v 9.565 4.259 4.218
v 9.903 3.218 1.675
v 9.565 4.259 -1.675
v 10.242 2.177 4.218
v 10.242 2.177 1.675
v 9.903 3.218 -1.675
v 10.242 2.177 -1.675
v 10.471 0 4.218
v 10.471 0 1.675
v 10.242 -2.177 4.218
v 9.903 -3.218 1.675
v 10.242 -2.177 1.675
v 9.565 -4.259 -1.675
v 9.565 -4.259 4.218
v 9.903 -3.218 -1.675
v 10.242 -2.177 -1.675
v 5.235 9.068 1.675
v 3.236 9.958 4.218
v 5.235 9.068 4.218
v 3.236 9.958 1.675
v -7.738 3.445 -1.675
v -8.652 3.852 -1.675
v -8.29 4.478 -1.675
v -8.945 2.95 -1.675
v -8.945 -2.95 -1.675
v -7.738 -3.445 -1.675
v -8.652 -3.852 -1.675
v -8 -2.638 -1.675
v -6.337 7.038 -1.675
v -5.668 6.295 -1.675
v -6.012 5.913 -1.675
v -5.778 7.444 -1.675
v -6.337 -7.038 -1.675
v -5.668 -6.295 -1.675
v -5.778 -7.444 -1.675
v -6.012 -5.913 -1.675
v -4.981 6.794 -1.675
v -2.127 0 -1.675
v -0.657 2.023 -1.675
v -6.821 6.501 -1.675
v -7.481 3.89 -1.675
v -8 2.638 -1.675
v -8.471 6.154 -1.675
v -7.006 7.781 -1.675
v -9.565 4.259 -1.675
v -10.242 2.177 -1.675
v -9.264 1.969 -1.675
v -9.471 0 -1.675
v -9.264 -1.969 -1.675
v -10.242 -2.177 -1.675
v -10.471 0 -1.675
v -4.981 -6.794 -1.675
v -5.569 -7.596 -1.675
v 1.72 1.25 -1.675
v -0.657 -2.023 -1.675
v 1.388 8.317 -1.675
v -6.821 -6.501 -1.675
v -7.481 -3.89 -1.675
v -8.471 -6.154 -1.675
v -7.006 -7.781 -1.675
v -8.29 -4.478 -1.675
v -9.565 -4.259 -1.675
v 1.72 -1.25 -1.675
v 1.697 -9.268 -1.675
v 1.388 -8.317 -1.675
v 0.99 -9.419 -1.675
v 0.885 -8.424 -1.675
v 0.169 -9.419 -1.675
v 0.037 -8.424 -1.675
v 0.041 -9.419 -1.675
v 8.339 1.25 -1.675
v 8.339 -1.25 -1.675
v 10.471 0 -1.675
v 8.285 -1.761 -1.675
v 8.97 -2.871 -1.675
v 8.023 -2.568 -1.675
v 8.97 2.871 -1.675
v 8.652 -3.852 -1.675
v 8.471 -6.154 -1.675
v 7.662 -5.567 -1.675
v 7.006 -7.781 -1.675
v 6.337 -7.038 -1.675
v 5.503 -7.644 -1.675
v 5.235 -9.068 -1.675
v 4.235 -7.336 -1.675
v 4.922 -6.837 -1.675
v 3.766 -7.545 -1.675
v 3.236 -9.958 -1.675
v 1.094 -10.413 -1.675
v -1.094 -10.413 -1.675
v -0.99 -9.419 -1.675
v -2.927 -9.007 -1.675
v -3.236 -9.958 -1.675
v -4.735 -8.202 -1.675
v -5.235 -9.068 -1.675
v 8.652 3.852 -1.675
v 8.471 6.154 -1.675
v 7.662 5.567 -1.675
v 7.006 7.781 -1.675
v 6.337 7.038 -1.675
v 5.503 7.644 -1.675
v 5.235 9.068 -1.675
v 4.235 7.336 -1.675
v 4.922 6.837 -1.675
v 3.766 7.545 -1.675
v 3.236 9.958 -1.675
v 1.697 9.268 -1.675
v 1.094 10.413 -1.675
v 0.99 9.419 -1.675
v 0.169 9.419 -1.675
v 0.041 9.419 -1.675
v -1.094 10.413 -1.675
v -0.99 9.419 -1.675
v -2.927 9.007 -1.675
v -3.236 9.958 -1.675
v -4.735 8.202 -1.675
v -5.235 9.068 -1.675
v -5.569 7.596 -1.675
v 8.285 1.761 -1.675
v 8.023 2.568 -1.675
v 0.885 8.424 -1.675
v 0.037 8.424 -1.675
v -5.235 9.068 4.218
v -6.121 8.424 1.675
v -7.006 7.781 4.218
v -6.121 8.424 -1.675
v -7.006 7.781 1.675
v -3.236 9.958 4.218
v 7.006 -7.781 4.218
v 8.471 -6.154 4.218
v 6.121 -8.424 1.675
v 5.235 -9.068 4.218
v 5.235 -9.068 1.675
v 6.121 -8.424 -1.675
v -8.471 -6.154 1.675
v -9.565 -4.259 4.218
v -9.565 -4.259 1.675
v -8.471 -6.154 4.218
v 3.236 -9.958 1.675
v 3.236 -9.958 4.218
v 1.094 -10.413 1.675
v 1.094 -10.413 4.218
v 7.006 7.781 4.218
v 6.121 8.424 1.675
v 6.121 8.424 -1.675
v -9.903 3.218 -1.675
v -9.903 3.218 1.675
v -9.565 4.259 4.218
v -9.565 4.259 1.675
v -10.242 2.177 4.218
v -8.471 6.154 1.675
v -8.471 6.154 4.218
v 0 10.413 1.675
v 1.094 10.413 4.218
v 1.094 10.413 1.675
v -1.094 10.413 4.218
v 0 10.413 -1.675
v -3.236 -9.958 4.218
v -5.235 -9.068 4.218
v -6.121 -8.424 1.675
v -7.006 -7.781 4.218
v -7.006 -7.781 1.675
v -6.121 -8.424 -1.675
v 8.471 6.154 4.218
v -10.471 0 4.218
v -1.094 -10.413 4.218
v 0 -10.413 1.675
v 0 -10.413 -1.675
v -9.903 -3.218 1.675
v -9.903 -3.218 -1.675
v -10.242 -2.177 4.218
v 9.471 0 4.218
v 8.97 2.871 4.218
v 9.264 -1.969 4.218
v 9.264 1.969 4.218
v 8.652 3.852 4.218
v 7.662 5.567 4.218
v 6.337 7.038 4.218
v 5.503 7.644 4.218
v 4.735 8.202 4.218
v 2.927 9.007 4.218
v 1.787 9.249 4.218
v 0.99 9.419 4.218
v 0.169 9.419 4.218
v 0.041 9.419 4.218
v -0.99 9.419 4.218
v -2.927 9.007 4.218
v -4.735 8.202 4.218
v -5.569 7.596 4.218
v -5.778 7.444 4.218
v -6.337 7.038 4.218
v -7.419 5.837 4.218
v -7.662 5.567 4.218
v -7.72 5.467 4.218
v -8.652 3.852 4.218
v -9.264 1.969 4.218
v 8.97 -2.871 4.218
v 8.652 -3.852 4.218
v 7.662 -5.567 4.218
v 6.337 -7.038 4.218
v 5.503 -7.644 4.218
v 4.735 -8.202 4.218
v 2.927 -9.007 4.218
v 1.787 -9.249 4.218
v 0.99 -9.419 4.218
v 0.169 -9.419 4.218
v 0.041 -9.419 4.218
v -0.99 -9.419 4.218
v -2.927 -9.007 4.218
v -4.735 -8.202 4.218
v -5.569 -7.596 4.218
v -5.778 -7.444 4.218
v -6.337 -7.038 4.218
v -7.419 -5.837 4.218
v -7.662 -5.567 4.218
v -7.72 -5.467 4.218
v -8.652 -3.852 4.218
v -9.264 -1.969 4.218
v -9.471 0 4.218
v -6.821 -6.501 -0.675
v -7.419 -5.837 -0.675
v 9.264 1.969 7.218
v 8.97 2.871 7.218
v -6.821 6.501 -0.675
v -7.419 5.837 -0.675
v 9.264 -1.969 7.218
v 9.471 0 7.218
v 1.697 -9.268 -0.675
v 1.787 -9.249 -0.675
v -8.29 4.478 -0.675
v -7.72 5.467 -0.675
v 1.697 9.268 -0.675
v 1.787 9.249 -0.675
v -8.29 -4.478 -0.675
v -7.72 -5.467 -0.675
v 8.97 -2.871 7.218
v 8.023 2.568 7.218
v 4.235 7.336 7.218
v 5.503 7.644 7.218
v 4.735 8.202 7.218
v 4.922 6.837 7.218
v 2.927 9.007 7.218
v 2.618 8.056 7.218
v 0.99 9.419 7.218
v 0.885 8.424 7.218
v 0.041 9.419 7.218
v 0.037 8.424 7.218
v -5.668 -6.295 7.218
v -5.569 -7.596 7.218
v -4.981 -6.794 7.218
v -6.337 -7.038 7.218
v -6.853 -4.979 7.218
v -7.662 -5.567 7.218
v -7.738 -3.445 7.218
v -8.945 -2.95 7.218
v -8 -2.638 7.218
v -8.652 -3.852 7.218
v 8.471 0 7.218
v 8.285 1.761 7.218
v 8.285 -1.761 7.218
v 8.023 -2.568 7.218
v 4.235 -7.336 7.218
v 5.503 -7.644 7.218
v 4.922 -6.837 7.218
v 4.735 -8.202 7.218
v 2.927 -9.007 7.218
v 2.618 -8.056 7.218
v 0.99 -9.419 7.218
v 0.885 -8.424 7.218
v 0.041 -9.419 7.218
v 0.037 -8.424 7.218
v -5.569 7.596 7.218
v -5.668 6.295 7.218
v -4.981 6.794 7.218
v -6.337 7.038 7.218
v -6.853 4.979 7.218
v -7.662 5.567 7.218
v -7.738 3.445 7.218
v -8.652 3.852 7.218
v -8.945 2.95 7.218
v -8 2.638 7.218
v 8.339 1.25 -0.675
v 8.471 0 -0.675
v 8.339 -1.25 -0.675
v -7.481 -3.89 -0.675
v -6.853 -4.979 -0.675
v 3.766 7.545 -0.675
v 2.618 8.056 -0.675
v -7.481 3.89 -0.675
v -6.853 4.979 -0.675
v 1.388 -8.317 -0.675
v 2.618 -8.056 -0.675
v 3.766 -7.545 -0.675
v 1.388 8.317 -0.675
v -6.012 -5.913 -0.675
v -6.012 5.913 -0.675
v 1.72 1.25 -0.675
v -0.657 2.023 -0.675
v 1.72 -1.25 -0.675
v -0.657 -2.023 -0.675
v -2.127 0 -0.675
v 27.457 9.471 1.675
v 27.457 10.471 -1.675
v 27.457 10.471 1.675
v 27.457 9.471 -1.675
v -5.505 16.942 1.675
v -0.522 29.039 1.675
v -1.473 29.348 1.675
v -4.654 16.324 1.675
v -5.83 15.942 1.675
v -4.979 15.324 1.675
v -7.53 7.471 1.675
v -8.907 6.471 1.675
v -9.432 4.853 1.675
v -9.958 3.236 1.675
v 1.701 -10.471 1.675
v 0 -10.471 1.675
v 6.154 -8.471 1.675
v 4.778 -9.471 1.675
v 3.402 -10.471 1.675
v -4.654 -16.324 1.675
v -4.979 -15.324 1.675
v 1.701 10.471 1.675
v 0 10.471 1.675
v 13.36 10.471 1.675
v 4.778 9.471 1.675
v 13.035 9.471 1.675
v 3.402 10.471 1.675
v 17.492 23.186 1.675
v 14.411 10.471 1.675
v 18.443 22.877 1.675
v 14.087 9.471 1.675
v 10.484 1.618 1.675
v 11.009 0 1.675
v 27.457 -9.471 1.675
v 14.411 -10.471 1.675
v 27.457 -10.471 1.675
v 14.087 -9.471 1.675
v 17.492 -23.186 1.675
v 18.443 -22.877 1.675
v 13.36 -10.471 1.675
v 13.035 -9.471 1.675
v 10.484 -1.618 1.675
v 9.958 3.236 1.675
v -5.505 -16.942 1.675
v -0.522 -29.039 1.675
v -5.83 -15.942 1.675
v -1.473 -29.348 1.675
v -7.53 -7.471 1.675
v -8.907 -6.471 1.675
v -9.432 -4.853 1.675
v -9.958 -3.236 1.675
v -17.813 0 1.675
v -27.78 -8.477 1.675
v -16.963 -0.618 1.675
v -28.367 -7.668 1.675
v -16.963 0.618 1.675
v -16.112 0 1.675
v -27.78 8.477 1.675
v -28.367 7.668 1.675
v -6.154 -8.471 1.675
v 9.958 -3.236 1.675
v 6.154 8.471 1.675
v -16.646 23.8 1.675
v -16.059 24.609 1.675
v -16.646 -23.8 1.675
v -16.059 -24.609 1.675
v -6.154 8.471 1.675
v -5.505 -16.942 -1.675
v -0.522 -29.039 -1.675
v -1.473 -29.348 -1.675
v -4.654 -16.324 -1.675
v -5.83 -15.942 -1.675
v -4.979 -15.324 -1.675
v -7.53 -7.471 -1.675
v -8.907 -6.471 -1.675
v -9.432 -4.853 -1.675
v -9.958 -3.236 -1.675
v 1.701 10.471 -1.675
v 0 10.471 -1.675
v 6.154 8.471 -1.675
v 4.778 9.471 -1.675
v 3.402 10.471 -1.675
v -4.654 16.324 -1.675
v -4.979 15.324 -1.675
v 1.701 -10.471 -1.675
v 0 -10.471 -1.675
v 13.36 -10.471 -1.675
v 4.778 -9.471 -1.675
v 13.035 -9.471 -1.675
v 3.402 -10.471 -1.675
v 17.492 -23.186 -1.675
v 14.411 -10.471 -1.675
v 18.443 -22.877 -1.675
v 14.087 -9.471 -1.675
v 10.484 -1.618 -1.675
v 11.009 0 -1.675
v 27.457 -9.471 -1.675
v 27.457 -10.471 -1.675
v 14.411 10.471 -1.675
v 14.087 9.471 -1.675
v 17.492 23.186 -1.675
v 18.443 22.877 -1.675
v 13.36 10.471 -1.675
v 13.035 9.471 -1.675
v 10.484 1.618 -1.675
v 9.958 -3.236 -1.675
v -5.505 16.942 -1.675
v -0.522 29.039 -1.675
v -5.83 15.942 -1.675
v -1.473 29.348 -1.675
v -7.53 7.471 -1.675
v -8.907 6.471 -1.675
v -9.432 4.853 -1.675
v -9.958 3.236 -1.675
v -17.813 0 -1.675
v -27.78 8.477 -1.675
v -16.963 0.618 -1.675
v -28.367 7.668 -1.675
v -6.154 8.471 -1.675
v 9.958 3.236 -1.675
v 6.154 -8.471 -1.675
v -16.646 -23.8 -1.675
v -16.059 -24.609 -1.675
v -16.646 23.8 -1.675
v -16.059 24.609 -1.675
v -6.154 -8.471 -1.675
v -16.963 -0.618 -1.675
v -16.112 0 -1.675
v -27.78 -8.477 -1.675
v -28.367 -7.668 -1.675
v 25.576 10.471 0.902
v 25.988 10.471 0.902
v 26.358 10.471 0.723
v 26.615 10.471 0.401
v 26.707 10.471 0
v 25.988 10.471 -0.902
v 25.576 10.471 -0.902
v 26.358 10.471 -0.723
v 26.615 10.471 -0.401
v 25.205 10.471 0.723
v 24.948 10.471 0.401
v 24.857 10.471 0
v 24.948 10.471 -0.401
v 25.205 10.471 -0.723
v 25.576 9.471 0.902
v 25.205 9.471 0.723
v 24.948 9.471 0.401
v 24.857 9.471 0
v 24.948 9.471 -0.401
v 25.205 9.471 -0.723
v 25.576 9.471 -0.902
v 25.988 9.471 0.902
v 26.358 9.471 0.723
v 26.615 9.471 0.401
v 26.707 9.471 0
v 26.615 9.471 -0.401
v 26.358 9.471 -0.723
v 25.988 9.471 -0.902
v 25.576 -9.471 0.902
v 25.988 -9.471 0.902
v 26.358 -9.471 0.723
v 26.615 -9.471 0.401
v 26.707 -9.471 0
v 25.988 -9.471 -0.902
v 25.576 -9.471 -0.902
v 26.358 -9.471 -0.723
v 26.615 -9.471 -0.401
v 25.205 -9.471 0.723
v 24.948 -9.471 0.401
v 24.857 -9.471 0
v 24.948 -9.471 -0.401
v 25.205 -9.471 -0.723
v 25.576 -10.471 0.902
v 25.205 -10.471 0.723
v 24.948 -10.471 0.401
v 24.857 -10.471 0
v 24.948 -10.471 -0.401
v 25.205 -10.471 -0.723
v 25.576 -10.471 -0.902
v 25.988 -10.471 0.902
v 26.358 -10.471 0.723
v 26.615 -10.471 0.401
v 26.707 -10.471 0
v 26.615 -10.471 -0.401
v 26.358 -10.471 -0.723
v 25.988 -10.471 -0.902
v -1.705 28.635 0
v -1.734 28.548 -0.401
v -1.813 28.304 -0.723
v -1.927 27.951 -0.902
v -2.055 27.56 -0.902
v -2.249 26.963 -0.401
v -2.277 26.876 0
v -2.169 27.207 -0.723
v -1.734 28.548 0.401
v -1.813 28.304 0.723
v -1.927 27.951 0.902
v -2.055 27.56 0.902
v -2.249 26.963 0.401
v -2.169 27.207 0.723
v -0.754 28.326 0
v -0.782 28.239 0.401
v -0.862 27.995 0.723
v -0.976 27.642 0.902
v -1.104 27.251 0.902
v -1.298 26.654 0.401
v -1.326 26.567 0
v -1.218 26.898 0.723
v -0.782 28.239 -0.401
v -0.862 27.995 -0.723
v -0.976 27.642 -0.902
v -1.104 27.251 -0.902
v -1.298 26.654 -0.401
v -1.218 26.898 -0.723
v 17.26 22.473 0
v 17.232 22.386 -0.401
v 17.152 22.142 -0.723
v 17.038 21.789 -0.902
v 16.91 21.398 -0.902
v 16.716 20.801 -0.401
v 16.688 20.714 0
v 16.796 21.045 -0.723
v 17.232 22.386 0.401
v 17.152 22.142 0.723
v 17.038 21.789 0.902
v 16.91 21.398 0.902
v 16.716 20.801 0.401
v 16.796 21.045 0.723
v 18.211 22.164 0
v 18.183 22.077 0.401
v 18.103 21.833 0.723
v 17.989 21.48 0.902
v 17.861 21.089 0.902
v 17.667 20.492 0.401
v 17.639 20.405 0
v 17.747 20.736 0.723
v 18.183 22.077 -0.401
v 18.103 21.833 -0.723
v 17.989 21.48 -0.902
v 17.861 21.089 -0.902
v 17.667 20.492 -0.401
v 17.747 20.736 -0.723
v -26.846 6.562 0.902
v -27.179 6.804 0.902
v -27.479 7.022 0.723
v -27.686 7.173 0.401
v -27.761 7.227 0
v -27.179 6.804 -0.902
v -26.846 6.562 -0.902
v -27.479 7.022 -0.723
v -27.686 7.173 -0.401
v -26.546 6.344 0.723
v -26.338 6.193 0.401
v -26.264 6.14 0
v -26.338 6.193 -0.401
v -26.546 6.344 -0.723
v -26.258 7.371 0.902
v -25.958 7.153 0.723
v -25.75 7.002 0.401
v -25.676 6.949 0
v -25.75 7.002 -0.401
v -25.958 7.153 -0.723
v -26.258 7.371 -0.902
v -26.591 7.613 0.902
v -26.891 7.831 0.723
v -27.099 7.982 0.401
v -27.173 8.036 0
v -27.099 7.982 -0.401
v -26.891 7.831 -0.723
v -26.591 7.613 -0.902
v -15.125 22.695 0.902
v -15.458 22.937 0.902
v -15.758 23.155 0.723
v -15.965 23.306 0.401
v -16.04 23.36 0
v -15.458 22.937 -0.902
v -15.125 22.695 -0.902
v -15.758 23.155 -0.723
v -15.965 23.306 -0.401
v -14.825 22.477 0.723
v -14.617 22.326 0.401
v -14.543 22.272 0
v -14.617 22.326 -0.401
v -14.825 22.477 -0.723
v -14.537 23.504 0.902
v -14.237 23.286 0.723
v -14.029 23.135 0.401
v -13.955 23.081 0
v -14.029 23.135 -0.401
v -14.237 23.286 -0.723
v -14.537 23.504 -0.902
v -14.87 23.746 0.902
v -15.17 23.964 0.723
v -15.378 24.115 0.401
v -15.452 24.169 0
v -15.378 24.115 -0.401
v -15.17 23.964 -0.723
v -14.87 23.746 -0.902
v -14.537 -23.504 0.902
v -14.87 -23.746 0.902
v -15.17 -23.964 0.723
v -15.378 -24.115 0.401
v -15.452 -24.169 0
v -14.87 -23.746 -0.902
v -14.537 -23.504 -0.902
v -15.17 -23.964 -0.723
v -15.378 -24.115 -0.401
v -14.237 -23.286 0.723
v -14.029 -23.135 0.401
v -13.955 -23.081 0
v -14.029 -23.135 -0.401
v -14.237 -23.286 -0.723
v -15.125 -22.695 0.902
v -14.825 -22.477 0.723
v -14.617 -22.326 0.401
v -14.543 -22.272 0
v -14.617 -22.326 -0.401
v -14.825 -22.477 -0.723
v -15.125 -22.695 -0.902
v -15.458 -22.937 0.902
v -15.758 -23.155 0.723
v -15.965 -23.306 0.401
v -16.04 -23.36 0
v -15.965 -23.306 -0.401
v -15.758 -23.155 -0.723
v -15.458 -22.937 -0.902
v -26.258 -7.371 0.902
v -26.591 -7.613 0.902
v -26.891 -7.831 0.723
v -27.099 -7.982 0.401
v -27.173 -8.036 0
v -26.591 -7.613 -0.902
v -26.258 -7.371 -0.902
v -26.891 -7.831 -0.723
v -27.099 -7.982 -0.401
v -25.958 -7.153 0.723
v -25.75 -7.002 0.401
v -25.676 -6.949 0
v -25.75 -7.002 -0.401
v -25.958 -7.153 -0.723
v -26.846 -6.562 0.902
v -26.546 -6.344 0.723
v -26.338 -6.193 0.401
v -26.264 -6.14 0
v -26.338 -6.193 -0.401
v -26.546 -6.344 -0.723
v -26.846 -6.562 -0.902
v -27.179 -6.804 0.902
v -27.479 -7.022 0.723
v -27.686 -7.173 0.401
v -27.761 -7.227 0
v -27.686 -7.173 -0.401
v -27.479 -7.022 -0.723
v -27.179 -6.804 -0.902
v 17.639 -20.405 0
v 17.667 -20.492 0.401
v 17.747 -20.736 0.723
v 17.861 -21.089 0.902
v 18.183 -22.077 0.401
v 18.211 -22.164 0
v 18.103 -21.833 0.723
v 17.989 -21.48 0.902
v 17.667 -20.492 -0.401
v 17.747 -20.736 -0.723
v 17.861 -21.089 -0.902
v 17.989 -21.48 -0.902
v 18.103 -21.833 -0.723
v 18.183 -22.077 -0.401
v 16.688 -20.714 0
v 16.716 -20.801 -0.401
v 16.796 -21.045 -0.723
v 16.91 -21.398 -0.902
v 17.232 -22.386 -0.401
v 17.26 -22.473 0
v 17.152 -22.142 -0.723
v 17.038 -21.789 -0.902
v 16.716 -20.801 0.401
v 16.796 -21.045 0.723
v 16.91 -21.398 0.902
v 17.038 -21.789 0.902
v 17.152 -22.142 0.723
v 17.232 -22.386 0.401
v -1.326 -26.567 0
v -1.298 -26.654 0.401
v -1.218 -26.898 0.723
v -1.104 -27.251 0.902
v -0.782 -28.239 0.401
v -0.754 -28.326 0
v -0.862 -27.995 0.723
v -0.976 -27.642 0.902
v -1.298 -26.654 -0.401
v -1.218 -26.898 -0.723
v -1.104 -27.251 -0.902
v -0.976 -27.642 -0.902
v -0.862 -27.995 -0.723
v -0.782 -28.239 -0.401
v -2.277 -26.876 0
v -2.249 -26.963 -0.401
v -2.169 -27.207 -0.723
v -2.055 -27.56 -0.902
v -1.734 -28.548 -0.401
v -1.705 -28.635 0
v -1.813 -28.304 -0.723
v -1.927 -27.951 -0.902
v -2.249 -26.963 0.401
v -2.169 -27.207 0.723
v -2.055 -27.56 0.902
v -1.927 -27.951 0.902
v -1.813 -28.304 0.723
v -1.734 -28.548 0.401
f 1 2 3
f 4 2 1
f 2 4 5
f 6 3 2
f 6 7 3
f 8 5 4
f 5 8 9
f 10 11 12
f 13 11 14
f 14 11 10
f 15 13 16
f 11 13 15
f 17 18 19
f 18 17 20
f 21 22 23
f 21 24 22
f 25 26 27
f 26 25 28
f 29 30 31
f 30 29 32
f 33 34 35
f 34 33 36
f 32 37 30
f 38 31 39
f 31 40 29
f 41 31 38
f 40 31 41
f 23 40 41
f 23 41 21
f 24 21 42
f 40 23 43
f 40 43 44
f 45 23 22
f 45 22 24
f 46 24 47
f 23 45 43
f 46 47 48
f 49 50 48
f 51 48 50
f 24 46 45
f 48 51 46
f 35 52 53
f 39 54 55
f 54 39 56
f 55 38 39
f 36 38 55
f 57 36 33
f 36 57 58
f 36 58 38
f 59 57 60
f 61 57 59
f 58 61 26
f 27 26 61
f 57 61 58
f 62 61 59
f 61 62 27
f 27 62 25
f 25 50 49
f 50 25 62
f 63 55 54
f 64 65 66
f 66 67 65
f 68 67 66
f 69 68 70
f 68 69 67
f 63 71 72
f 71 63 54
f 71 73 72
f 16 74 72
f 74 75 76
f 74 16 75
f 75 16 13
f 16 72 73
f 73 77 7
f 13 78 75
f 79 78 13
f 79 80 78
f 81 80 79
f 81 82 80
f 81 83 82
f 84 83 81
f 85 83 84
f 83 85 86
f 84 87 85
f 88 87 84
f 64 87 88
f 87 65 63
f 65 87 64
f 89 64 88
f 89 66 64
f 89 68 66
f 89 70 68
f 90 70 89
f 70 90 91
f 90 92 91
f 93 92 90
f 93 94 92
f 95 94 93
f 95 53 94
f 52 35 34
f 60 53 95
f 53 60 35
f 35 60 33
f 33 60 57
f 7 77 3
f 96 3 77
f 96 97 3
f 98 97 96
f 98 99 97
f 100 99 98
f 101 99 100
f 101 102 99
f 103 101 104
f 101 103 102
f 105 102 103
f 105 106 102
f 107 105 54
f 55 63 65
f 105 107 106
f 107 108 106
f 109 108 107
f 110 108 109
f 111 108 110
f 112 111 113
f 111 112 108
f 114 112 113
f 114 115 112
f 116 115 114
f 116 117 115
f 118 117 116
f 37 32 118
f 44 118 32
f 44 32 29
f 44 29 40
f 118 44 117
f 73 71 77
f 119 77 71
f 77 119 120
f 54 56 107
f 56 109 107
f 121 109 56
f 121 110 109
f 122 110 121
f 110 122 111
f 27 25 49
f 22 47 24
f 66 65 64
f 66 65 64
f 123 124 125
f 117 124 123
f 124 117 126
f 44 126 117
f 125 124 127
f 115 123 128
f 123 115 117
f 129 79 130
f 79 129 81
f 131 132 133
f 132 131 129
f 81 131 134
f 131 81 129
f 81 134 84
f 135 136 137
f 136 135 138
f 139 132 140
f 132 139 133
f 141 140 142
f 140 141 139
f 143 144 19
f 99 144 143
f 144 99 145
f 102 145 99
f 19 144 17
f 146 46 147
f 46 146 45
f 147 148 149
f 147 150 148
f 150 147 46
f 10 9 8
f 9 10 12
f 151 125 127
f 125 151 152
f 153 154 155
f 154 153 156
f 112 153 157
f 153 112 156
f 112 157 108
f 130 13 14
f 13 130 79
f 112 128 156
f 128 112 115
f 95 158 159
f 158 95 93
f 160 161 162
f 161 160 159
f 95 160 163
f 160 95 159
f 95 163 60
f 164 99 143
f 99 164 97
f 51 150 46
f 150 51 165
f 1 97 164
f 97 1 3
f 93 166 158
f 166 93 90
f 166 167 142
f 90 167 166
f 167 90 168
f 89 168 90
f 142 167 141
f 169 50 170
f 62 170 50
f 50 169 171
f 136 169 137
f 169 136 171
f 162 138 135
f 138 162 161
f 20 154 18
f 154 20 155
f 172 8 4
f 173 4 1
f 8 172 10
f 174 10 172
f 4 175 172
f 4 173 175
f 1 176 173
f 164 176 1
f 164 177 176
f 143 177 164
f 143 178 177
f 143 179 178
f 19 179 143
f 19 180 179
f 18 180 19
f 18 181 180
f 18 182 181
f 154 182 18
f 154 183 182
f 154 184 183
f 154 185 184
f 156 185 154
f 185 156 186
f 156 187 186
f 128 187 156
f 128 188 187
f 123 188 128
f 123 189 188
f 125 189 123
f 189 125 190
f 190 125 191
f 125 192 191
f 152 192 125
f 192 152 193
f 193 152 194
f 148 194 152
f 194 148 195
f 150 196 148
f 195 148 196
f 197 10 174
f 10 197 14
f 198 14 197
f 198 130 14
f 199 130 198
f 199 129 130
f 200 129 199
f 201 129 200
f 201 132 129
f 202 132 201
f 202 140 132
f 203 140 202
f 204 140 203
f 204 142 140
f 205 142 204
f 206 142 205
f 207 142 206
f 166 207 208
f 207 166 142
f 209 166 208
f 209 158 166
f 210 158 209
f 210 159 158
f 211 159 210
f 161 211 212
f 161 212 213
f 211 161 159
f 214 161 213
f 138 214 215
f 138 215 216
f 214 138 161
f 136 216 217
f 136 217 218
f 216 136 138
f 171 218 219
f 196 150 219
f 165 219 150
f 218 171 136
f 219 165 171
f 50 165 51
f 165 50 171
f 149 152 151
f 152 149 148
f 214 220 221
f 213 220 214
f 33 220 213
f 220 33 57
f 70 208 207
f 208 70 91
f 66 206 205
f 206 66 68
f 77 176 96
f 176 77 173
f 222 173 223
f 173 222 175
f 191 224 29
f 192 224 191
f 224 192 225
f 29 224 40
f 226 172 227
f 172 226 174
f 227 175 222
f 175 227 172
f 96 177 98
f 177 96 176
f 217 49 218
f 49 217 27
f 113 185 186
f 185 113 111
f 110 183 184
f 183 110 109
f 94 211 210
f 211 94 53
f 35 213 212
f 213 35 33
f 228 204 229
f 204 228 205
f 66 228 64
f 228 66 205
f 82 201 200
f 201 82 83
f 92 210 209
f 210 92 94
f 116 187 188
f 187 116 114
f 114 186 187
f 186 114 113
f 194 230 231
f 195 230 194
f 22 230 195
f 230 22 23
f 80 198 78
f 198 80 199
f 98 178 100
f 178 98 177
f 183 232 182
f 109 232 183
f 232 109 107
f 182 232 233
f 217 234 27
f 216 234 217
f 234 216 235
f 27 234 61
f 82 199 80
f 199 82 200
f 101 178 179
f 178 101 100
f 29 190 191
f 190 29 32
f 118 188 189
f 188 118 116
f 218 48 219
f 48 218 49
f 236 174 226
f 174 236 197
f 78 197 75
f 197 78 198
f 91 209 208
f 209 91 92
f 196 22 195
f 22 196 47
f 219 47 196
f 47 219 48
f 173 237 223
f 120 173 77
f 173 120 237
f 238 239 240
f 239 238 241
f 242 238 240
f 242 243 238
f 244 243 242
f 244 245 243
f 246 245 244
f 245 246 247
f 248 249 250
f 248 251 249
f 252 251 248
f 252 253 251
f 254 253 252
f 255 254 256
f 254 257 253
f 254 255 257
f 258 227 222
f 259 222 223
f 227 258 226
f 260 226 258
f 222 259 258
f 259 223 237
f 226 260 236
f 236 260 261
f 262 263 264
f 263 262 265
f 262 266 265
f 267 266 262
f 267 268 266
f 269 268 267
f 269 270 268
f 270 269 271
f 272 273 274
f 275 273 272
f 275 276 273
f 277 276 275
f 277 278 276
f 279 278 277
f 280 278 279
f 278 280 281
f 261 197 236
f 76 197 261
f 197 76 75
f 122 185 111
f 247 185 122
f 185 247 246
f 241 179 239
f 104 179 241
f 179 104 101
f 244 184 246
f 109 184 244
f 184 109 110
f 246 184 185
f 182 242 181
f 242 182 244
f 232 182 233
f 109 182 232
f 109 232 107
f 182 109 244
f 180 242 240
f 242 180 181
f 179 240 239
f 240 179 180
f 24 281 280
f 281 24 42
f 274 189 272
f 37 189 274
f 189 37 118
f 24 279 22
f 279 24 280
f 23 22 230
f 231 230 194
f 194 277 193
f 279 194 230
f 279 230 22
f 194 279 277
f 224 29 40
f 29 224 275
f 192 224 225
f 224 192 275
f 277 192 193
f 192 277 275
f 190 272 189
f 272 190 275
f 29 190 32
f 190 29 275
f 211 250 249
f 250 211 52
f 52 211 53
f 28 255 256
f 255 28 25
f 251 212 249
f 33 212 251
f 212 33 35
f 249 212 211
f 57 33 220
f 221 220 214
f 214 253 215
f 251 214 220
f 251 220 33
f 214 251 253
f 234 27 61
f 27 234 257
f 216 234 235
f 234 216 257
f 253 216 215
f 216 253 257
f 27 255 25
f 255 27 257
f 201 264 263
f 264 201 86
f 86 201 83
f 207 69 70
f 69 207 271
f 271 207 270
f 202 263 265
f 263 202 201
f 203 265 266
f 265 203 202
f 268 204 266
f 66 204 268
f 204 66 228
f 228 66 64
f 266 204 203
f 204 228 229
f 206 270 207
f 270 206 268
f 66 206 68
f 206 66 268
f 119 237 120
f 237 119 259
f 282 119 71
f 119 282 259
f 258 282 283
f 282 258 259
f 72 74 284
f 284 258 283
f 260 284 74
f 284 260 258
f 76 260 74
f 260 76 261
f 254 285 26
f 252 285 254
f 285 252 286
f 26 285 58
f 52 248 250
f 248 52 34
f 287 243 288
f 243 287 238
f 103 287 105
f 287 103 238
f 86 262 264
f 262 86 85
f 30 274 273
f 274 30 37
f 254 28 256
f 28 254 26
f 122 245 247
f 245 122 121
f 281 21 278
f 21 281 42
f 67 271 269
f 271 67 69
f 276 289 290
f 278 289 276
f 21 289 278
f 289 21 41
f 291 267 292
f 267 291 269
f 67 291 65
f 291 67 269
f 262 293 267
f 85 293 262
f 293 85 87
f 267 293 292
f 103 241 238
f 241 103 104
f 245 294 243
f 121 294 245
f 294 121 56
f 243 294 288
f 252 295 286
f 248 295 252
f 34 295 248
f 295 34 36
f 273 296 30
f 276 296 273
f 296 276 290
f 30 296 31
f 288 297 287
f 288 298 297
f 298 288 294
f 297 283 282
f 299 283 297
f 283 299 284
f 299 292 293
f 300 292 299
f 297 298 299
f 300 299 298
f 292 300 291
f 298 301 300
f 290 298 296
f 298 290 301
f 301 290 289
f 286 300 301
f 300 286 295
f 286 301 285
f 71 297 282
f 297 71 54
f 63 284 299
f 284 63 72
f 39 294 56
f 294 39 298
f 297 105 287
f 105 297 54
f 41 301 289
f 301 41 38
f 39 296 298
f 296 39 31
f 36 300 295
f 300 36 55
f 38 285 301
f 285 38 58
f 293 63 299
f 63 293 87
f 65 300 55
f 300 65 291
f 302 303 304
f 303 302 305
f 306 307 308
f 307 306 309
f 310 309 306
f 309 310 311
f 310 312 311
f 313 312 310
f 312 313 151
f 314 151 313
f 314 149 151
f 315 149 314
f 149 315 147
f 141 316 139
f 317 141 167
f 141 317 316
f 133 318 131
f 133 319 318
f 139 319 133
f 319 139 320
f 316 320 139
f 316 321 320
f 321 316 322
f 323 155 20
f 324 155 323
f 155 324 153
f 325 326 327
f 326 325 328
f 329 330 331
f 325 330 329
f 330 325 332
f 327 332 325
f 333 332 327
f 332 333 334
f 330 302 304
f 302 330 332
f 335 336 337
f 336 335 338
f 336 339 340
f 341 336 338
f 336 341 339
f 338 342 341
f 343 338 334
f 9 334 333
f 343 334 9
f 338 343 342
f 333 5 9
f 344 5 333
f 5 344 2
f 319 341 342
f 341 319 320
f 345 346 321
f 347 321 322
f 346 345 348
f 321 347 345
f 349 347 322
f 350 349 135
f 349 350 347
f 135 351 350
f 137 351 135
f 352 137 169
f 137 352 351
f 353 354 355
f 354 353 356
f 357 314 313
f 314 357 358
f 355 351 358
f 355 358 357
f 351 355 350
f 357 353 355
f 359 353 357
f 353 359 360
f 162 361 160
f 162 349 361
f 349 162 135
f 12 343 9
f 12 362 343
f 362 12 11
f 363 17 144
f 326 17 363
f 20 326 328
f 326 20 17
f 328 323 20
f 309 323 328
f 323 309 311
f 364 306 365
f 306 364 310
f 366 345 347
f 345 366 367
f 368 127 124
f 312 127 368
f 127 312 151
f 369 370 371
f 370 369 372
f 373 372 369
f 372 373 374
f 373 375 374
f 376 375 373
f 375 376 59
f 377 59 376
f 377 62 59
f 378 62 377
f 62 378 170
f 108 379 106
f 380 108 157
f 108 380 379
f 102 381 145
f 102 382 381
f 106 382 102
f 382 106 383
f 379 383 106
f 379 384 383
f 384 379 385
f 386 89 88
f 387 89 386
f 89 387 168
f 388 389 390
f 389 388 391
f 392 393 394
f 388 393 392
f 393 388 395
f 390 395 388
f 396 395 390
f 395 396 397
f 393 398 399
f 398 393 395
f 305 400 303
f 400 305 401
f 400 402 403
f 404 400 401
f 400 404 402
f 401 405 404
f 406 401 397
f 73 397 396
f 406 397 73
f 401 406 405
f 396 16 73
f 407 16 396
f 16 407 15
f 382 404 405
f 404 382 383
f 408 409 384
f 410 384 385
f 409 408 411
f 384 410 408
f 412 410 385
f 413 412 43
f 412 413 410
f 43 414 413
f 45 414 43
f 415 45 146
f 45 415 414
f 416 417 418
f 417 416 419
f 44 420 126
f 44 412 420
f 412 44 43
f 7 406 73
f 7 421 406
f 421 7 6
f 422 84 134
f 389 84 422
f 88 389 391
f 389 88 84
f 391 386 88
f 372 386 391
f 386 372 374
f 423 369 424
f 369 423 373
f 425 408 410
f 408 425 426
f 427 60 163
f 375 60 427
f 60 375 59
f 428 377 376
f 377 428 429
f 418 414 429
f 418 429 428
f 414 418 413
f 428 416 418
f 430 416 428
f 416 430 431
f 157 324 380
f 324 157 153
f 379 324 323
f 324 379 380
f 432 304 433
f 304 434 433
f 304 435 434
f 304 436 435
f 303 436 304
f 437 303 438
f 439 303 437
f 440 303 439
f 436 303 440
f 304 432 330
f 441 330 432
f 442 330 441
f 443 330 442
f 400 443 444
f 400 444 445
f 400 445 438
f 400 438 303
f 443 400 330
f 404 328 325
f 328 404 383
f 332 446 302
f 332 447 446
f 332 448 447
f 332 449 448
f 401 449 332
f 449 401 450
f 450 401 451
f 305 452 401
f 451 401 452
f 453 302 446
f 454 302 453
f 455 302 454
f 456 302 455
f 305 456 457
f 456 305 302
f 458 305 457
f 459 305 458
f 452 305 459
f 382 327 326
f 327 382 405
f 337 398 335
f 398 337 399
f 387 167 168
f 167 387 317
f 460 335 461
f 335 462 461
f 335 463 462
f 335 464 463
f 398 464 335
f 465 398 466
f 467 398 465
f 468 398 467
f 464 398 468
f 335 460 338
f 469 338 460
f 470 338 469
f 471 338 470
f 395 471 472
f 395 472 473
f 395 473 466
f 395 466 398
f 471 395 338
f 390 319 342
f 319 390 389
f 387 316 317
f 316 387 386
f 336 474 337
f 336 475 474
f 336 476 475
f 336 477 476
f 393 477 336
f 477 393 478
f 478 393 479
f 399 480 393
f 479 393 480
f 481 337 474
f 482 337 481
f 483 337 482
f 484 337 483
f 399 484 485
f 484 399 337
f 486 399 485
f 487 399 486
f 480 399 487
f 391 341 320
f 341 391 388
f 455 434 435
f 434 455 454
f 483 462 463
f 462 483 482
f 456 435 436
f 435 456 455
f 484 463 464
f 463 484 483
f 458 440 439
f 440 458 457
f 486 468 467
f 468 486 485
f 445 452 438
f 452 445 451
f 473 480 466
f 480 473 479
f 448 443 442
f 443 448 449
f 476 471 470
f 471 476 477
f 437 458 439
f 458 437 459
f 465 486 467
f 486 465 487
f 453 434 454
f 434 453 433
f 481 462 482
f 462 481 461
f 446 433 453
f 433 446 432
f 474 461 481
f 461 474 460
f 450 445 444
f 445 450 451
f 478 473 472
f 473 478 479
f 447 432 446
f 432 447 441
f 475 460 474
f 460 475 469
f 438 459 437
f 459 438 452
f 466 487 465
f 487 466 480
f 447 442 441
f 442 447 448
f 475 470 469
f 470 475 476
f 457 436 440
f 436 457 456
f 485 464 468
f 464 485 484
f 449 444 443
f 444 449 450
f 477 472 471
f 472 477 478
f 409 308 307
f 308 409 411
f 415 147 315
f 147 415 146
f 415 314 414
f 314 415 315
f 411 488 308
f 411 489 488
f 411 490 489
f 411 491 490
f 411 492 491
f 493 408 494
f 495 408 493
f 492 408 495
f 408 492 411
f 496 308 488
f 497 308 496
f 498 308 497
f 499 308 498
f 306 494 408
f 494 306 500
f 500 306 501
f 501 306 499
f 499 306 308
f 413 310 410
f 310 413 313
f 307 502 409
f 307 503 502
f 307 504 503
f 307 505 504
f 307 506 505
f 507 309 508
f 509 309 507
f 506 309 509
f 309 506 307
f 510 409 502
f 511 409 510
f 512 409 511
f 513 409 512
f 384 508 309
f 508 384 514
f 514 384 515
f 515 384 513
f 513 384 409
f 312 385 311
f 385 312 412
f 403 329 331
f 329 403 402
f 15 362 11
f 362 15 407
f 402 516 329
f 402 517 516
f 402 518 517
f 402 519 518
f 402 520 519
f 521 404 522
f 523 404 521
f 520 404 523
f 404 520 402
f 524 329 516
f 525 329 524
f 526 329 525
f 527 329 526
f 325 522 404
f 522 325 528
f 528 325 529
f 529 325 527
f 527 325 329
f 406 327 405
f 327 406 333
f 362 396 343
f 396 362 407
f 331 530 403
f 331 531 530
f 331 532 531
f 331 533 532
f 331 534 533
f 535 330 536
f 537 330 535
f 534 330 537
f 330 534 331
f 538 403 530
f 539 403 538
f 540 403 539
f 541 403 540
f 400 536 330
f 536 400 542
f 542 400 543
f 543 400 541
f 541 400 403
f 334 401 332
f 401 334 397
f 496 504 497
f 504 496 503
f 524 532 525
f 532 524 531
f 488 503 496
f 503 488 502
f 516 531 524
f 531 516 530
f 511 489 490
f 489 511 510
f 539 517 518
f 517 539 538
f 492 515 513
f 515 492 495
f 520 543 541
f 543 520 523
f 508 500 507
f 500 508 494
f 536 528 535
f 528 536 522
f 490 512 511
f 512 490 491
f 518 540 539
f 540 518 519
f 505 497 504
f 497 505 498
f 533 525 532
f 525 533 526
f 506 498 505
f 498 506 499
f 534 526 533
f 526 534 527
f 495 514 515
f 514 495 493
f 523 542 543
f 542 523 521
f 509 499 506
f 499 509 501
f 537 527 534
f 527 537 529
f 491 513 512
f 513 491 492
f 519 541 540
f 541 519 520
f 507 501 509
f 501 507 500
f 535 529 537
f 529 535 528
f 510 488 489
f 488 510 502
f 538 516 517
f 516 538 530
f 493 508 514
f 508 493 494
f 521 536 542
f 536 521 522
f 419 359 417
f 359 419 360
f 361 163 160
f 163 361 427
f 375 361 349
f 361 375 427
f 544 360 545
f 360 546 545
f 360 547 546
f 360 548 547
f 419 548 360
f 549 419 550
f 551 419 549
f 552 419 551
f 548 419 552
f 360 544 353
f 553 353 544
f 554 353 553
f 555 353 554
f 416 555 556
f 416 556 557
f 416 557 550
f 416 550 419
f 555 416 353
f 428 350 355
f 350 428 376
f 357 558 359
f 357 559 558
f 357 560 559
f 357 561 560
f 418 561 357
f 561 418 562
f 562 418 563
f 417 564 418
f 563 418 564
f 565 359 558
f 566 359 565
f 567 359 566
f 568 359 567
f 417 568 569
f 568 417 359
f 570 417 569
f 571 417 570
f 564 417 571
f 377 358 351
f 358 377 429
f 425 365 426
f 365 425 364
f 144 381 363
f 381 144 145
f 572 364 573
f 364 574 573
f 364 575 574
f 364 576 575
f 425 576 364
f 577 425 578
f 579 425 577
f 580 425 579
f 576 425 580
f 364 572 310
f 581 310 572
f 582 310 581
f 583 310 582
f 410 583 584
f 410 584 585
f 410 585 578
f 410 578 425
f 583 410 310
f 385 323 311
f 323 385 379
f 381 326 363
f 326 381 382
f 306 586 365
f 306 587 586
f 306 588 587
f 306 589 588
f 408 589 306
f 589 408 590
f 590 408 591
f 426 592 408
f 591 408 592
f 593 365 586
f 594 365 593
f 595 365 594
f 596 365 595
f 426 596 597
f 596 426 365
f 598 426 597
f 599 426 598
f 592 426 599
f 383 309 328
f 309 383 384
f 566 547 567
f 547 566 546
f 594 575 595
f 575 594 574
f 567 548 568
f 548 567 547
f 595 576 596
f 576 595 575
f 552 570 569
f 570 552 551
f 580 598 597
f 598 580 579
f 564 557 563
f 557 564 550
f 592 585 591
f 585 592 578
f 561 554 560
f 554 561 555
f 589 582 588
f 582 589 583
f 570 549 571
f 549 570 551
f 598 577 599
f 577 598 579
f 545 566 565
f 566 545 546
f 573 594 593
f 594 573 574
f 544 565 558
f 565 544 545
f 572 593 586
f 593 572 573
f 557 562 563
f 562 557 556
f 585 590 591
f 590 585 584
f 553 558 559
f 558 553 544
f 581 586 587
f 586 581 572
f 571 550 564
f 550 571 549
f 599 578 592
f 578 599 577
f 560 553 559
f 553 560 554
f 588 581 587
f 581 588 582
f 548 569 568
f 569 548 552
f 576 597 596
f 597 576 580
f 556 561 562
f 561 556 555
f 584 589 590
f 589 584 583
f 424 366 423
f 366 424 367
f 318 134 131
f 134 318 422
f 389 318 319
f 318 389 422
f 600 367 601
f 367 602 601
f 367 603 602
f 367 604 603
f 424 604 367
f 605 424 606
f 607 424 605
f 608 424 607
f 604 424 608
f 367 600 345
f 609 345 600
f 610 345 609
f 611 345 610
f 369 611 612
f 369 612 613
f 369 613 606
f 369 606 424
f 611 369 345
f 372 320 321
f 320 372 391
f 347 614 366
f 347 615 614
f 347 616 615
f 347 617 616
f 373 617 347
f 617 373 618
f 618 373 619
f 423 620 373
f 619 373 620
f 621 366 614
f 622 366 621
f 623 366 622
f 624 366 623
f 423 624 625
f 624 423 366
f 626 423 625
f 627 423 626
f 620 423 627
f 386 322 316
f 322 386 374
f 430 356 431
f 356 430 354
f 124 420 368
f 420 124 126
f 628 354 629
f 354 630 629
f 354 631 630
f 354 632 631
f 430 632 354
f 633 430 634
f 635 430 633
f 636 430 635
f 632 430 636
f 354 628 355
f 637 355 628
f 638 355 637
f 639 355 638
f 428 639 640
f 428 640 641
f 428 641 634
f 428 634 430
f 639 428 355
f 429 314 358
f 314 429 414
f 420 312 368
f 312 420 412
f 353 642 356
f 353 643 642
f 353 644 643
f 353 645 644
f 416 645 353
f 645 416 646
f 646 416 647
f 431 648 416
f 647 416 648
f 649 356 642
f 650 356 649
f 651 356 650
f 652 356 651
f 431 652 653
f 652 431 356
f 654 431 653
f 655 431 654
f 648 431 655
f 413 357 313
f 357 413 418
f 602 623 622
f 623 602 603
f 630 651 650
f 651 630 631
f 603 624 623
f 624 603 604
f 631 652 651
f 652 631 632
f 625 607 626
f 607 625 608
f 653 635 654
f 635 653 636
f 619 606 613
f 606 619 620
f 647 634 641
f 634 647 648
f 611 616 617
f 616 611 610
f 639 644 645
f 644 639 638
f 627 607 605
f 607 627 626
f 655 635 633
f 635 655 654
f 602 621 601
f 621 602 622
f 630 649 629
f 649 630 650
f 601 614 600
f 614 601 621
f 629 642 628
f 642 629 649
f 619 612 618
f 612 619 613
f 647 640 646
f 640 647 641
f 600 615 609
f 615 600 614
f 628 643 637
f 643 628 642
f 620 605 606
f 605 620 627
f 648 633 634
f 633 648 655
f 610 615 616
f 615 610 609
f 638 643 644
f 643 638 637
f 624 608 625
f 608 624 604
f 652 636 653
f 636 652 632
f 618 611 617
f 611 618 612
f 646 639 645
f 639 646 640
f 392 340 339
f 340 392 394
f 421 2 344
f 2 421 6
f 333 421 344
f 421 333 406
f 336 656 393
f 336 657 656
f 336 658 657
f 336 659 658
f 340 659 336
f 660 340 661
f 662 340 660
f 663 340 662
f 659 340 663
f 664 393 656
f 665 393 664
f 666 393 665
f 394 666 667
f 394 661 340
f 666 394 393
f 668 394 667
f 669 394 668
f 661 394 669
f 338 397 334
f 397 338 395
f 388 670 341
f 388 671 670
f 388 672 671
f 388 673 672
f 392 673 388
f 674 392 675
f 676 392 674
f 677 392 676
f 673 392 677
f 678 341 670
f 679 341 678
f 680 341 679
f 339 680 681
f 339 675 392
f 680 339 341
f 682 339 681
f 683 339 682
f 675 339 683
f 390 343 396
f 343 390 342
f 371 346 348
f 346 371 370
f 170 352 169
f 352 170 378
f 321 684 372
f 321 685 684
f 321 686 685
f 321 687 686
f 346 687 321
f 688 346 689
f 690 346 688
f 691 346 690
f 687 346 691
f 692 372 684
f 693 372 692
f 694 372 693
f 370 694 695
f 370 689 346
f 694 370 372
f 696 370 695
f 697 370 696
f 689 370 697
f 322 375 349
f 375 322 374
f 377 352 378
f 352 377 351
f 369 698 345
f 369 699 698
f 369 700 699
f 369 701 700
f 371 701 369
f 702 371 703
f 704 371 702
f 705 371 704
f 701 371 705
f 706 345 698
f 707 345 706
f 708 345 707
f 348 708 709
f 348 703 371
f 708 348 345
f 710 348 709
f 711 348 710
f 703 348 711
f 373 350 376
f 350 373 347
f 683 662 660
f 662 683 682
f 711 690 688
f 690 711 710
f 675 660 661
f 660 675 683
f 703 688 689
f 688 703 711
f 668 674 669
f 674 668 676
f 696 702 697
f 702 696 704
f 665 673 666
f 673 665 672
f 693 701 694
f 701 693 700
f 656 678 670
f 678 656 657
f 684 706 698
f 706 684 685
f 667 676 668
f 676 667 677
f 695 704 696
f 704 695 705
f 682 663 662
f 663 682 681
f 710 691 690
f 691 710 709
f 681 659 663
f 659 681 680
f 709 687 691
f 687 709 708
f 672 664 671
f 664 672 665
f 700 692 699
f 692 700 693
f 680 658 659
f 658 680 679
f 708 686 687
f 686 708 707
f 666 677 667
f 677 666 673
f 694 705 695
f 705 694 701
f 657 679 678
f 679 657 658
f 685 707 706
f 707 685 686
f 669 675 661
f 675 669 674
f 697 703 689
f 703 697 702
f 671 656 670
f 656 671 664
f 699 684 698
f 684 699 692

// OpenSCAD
// file: Transforms.scad
module shine(angle=10, length=10, height=10, center=true) {
    if($children != 0) {
        intersection() {
            linear_extrude(height) {
                if(center) {
                    polygon([[0,0] , [length*cos(angle/2),length*sin(angle/2)] , [length,0] , [length*cos(-angle/2),length*sin(-angle/2)]]);
                }
                else {
                    polygon([[0,0] , [length*cos(angle),length*sin(angle)] ,  [length*cos(angle/2),length*sin(angle/2)] , [length,0]]);
                }
            } 
            children(); 
        }
    }   
    else {
        linear_extrude(height) {
            if(center) {
                polygon([[0,0] , [length*cos(angle/2),length*sin(angle/2)] , [length,0] , [length*cos(-angle/2),length*sin(-angle/2)]]);
            }
            else {
                polygon([[0,0] , [length*cos(angle),length*sin(angle)] ,  [length*cos(angle/2),length*sin(angle/2)] , [length,0]]);
            }
        }
    }  
}  

    
module cut(size=[10,10,10],translation=[0,0,0]) {
    intersection() {
        children();
        translate(translation) cube(size);
    }
}
// main file
/*
	.scad file created for the subwheel system of the 3D Printable Omni-Wheels used for the robot.
	
	Author 	= Xasin
	Created	= 17.09.15
*/

use <Transforms.scad>

function subwheelRadius(n, r) = r - cos(360/(2*n))*r + subwheelBaseSize;		//Calculate the radius of a standard subwheel at largest point (Center)
function wheelOffset(n, r) = cos(360/(2*n))*r;						//Calculate the offset of a subwheel that is required to shift it so that it aligns with the main circle (CAUTION Does not implement subwheel size shift!!)
function connectorOffset(n, r) = (sin(360/(2*n))*r);					//Calculate the offset for the cuts on the wheels. (Y axis on the 2D model of a subwheel before being rotated.
	
$fs = 1;

//AXIS HOLE VARIABLE
axisDiameter = 1.75;
axisPlay = 0.4;


subwheelBaseSize = 2.75;

module subwheelBase(n, r=20, p=0, shift = subwheelBaseSize, split=true, positioned=true) {  //The base structure of a Subwheel, basically a slice of a circle of the radius of the wheel, cut down to be rotated into a proper subwheel for a wheel of Radius R with N Subwheels.
	
	//Position the wheel according to the given parameters (Aling it to the outside of the main wheel and rotate it around into position p.)
	render(4) if(positioned) {
		//Rotate to the according outside position.
		rotate([0, 0, (360/n) * p])
		//Translate to the edge of the circle
		translate([ wheelOffset(n, r) - shift, 0, 0])
		//Rotate into horizontal position
		rotate([-90, 0, 0]) 
		//The main core of the subwheel
		subwheelBase(n, r, p, shift, split, false);
	}
	//Generate a standard subwheel without moving it around.
	else {
		render(convexity=4) difference() {				//Render the subwheel and make it hollow.
			union() {
				rotate_extrude() difference() {		//Generate the main subwheel
					intersection() {					//2D Model for the basic subwheel
						translate([ - wheelOffset(n, r) + shift, 0]) circle(r=r, $fn = 70);		//Main circle	
						translate([0, - sin(360/(2*n))*r]) square(sin(360/(2*n))*r *2);			//Intersecting square to only have the desired part of the circle
					}	
						
				}
				translate([0, 0, - sin(360/(2*n))*r]) cylinder(r=shift, h= sin(360/(2*n))*r *2);	//Central cylinder inside for the axis.
			}
			
			if(split) {
				translate([0,0,-(sin(360/(2*n))*r)]) cylinder(d= axisDiameter + axisPlay, h= 2* sin(360/(2*n))*r,$fn=15);	//Slot for the Filament-Axis, rolling
			}
		}
	}
}

//OMNIWHEEL BASE VARIABLES
cRad = axisDiameter/2 + 0.8; 	//Radius of the connectors to the subwheels (Best is slightly smaller than the subwheel.
cThick = 1; 	//Thickness of the connectors.
cPlay = 0.2; 	//Play room for the connector ports (distance to the subwheel)

//Create a connecting beam for the subwheels
module subwheelConnector(n, r, i) {
	rotate([0,0, (360/n)*i]) 
	difference() {
		intersection() {
			union() {
				//translate([wheelOffset(n, r) - subwheelBaseSize, connectorOffset(n, r) + cPlay + cThick]) rotate([90, 0, 0]) cylinder(r= cRad, h= cThick, $fn = 13);
				
				translate([0, connectorOffset(n, r) + cPlay, -cRad]) 
					cube([wheelOffset(n, r) - subwheelBaseSize + cRad, cThick, cRad*2]);
				
				//translate([wheelOffset(n, r) - subwheelBaseSize, -connectorOffset(n, r) - cPlay]) rotate([90, 0, 0]) cylinder(r= cRad, h= cThick, $fn = 13);
						
				translate([0, -connectorOffset(n, r) - cPlay - cThick, -cRad]) 
					cube([wheelOffset(n, r) - subwheelBaseSize + cRad, cThick, cRad*2]);
			}
			
			translate([0,0, -cRad]) cylinder(r=r - 0.3, h= cRad*2);
		}
		
		translate([wheelOffset(n, r) - subwheelBaseSize, connectorOffset(n, r) + 5, 0]) rotate([90,0,0]) cylinder(d= axisDiameter + 0.1, h= connectorOffset(n, r)*2 + 10, $fn=14);
	}
}

//Create a set of subwheels as they would be normally positioned. Inflated = true makes them bigger; useful for creating space around the wheels.
module subwheelSet(n, r, inflated=false) {
	for(i=[0:2:n]) { 	
		if(inflated) {		
			subwheelBase(n, r, i, shift = subwheelBaseSize + 0.5, split=false);									//Create a /bigger/ subwheel in normal, ground position.
		}
		else {
			subwheelBase(n, r, i);									//Do the same as above, however using default subwheels instead of bigger subwheels here.
		}
	}
}

//Create a subwheel connector set for the according wheel of size r with n subwheels.
module connectorSet(n, r) {
	for(i=[0:2:n]) {
		subwheelConnector(n, r, i);
	}
}

//FRAME VARIABLES
frameThickness = 1;
connectorThickness = 1;
beamThickness = 2.5; //Thickness of the beams

//The Mainframe of the OmniWheel
module omniWheel(n, r, subwheels = false) {
	
	//Central Cylinder 
	translate([0,0, - cRad]) difference() {
		cylinder(r= connectorOffset(n, r) + cPlay + cThick, h= cRad + subwheelRadius(n, r));		//Create the central cylinder.
		cylinder(r= connectorOffset(n, r) + cPlay + cThick- frameThickness, h= cRad + subwheelRadius(n, r));	//Hollow it out
		subwheelSet(n, r, true); 	//Make sure that there is enough space for the subwheels.
	}
	
	//Cylinder Interconnections
	translate([0,0, -cRad]) difference() {
		for(i=[0:(360/n)*2:360]) 
			rotate([0,0, i])
			shine(height= cRad + subwheelRadius(n, r) + 3, angle=(360/n) - 0.5, length= r)					//Create an "angle" for the connectors to create an alternating, tooth-like pattern.
			cylinder(r= connectorOffset(n, r) + cPlay + cThick - frameThickness, h= cRad + subwheelRadius(n, r) + 3);	//Create the actual cylinder pieces.
		
		cylinder(r= connectorOffset(n, r) + cPlay + cThick - frameThickness - connectorThickness, h= cRad + subwheelRadius(n, r) + 3);	//Cut the connectors down the appropriate size.
	}

	//Structural beams
	translate([0,0, -cRad]) intersection() {
		cylinder(r= connectorOffset(n, r) + cPlay, h= cRad*2);
		
		for(i=[0:360/n*2:360]) 
			rotate([0,0, i]) translate([0, -beamThickness/2, 0]) cube([r -  subwheelRadius(n, r) - 6, beamThickness, 1]);
	}	
	
	//Connectors
	difference() {
		connectorSet(n, r);			//Create the connectors
		translate([0,0, -cRad]) cylinder(r= connectorOffset(n, r) + cPlay - 0.001, h= cRad + subwheelRadius(n, r)); //Make sure they don't enter the central cylinder
	}
	
	
	if(subwheels) {					//If desired, create subwheels around the model for a better visual inspection.
		%subwheelSet(n, r);
	}
}

rad = 30;
num = 10;

!omniWheel(num, rad, true);

for(i=[0:1]) translate([i* subwheelRadius(num, rad)*2 + 2*i, 0, 0]) subwheelBase(num, rad, positioned=false);
